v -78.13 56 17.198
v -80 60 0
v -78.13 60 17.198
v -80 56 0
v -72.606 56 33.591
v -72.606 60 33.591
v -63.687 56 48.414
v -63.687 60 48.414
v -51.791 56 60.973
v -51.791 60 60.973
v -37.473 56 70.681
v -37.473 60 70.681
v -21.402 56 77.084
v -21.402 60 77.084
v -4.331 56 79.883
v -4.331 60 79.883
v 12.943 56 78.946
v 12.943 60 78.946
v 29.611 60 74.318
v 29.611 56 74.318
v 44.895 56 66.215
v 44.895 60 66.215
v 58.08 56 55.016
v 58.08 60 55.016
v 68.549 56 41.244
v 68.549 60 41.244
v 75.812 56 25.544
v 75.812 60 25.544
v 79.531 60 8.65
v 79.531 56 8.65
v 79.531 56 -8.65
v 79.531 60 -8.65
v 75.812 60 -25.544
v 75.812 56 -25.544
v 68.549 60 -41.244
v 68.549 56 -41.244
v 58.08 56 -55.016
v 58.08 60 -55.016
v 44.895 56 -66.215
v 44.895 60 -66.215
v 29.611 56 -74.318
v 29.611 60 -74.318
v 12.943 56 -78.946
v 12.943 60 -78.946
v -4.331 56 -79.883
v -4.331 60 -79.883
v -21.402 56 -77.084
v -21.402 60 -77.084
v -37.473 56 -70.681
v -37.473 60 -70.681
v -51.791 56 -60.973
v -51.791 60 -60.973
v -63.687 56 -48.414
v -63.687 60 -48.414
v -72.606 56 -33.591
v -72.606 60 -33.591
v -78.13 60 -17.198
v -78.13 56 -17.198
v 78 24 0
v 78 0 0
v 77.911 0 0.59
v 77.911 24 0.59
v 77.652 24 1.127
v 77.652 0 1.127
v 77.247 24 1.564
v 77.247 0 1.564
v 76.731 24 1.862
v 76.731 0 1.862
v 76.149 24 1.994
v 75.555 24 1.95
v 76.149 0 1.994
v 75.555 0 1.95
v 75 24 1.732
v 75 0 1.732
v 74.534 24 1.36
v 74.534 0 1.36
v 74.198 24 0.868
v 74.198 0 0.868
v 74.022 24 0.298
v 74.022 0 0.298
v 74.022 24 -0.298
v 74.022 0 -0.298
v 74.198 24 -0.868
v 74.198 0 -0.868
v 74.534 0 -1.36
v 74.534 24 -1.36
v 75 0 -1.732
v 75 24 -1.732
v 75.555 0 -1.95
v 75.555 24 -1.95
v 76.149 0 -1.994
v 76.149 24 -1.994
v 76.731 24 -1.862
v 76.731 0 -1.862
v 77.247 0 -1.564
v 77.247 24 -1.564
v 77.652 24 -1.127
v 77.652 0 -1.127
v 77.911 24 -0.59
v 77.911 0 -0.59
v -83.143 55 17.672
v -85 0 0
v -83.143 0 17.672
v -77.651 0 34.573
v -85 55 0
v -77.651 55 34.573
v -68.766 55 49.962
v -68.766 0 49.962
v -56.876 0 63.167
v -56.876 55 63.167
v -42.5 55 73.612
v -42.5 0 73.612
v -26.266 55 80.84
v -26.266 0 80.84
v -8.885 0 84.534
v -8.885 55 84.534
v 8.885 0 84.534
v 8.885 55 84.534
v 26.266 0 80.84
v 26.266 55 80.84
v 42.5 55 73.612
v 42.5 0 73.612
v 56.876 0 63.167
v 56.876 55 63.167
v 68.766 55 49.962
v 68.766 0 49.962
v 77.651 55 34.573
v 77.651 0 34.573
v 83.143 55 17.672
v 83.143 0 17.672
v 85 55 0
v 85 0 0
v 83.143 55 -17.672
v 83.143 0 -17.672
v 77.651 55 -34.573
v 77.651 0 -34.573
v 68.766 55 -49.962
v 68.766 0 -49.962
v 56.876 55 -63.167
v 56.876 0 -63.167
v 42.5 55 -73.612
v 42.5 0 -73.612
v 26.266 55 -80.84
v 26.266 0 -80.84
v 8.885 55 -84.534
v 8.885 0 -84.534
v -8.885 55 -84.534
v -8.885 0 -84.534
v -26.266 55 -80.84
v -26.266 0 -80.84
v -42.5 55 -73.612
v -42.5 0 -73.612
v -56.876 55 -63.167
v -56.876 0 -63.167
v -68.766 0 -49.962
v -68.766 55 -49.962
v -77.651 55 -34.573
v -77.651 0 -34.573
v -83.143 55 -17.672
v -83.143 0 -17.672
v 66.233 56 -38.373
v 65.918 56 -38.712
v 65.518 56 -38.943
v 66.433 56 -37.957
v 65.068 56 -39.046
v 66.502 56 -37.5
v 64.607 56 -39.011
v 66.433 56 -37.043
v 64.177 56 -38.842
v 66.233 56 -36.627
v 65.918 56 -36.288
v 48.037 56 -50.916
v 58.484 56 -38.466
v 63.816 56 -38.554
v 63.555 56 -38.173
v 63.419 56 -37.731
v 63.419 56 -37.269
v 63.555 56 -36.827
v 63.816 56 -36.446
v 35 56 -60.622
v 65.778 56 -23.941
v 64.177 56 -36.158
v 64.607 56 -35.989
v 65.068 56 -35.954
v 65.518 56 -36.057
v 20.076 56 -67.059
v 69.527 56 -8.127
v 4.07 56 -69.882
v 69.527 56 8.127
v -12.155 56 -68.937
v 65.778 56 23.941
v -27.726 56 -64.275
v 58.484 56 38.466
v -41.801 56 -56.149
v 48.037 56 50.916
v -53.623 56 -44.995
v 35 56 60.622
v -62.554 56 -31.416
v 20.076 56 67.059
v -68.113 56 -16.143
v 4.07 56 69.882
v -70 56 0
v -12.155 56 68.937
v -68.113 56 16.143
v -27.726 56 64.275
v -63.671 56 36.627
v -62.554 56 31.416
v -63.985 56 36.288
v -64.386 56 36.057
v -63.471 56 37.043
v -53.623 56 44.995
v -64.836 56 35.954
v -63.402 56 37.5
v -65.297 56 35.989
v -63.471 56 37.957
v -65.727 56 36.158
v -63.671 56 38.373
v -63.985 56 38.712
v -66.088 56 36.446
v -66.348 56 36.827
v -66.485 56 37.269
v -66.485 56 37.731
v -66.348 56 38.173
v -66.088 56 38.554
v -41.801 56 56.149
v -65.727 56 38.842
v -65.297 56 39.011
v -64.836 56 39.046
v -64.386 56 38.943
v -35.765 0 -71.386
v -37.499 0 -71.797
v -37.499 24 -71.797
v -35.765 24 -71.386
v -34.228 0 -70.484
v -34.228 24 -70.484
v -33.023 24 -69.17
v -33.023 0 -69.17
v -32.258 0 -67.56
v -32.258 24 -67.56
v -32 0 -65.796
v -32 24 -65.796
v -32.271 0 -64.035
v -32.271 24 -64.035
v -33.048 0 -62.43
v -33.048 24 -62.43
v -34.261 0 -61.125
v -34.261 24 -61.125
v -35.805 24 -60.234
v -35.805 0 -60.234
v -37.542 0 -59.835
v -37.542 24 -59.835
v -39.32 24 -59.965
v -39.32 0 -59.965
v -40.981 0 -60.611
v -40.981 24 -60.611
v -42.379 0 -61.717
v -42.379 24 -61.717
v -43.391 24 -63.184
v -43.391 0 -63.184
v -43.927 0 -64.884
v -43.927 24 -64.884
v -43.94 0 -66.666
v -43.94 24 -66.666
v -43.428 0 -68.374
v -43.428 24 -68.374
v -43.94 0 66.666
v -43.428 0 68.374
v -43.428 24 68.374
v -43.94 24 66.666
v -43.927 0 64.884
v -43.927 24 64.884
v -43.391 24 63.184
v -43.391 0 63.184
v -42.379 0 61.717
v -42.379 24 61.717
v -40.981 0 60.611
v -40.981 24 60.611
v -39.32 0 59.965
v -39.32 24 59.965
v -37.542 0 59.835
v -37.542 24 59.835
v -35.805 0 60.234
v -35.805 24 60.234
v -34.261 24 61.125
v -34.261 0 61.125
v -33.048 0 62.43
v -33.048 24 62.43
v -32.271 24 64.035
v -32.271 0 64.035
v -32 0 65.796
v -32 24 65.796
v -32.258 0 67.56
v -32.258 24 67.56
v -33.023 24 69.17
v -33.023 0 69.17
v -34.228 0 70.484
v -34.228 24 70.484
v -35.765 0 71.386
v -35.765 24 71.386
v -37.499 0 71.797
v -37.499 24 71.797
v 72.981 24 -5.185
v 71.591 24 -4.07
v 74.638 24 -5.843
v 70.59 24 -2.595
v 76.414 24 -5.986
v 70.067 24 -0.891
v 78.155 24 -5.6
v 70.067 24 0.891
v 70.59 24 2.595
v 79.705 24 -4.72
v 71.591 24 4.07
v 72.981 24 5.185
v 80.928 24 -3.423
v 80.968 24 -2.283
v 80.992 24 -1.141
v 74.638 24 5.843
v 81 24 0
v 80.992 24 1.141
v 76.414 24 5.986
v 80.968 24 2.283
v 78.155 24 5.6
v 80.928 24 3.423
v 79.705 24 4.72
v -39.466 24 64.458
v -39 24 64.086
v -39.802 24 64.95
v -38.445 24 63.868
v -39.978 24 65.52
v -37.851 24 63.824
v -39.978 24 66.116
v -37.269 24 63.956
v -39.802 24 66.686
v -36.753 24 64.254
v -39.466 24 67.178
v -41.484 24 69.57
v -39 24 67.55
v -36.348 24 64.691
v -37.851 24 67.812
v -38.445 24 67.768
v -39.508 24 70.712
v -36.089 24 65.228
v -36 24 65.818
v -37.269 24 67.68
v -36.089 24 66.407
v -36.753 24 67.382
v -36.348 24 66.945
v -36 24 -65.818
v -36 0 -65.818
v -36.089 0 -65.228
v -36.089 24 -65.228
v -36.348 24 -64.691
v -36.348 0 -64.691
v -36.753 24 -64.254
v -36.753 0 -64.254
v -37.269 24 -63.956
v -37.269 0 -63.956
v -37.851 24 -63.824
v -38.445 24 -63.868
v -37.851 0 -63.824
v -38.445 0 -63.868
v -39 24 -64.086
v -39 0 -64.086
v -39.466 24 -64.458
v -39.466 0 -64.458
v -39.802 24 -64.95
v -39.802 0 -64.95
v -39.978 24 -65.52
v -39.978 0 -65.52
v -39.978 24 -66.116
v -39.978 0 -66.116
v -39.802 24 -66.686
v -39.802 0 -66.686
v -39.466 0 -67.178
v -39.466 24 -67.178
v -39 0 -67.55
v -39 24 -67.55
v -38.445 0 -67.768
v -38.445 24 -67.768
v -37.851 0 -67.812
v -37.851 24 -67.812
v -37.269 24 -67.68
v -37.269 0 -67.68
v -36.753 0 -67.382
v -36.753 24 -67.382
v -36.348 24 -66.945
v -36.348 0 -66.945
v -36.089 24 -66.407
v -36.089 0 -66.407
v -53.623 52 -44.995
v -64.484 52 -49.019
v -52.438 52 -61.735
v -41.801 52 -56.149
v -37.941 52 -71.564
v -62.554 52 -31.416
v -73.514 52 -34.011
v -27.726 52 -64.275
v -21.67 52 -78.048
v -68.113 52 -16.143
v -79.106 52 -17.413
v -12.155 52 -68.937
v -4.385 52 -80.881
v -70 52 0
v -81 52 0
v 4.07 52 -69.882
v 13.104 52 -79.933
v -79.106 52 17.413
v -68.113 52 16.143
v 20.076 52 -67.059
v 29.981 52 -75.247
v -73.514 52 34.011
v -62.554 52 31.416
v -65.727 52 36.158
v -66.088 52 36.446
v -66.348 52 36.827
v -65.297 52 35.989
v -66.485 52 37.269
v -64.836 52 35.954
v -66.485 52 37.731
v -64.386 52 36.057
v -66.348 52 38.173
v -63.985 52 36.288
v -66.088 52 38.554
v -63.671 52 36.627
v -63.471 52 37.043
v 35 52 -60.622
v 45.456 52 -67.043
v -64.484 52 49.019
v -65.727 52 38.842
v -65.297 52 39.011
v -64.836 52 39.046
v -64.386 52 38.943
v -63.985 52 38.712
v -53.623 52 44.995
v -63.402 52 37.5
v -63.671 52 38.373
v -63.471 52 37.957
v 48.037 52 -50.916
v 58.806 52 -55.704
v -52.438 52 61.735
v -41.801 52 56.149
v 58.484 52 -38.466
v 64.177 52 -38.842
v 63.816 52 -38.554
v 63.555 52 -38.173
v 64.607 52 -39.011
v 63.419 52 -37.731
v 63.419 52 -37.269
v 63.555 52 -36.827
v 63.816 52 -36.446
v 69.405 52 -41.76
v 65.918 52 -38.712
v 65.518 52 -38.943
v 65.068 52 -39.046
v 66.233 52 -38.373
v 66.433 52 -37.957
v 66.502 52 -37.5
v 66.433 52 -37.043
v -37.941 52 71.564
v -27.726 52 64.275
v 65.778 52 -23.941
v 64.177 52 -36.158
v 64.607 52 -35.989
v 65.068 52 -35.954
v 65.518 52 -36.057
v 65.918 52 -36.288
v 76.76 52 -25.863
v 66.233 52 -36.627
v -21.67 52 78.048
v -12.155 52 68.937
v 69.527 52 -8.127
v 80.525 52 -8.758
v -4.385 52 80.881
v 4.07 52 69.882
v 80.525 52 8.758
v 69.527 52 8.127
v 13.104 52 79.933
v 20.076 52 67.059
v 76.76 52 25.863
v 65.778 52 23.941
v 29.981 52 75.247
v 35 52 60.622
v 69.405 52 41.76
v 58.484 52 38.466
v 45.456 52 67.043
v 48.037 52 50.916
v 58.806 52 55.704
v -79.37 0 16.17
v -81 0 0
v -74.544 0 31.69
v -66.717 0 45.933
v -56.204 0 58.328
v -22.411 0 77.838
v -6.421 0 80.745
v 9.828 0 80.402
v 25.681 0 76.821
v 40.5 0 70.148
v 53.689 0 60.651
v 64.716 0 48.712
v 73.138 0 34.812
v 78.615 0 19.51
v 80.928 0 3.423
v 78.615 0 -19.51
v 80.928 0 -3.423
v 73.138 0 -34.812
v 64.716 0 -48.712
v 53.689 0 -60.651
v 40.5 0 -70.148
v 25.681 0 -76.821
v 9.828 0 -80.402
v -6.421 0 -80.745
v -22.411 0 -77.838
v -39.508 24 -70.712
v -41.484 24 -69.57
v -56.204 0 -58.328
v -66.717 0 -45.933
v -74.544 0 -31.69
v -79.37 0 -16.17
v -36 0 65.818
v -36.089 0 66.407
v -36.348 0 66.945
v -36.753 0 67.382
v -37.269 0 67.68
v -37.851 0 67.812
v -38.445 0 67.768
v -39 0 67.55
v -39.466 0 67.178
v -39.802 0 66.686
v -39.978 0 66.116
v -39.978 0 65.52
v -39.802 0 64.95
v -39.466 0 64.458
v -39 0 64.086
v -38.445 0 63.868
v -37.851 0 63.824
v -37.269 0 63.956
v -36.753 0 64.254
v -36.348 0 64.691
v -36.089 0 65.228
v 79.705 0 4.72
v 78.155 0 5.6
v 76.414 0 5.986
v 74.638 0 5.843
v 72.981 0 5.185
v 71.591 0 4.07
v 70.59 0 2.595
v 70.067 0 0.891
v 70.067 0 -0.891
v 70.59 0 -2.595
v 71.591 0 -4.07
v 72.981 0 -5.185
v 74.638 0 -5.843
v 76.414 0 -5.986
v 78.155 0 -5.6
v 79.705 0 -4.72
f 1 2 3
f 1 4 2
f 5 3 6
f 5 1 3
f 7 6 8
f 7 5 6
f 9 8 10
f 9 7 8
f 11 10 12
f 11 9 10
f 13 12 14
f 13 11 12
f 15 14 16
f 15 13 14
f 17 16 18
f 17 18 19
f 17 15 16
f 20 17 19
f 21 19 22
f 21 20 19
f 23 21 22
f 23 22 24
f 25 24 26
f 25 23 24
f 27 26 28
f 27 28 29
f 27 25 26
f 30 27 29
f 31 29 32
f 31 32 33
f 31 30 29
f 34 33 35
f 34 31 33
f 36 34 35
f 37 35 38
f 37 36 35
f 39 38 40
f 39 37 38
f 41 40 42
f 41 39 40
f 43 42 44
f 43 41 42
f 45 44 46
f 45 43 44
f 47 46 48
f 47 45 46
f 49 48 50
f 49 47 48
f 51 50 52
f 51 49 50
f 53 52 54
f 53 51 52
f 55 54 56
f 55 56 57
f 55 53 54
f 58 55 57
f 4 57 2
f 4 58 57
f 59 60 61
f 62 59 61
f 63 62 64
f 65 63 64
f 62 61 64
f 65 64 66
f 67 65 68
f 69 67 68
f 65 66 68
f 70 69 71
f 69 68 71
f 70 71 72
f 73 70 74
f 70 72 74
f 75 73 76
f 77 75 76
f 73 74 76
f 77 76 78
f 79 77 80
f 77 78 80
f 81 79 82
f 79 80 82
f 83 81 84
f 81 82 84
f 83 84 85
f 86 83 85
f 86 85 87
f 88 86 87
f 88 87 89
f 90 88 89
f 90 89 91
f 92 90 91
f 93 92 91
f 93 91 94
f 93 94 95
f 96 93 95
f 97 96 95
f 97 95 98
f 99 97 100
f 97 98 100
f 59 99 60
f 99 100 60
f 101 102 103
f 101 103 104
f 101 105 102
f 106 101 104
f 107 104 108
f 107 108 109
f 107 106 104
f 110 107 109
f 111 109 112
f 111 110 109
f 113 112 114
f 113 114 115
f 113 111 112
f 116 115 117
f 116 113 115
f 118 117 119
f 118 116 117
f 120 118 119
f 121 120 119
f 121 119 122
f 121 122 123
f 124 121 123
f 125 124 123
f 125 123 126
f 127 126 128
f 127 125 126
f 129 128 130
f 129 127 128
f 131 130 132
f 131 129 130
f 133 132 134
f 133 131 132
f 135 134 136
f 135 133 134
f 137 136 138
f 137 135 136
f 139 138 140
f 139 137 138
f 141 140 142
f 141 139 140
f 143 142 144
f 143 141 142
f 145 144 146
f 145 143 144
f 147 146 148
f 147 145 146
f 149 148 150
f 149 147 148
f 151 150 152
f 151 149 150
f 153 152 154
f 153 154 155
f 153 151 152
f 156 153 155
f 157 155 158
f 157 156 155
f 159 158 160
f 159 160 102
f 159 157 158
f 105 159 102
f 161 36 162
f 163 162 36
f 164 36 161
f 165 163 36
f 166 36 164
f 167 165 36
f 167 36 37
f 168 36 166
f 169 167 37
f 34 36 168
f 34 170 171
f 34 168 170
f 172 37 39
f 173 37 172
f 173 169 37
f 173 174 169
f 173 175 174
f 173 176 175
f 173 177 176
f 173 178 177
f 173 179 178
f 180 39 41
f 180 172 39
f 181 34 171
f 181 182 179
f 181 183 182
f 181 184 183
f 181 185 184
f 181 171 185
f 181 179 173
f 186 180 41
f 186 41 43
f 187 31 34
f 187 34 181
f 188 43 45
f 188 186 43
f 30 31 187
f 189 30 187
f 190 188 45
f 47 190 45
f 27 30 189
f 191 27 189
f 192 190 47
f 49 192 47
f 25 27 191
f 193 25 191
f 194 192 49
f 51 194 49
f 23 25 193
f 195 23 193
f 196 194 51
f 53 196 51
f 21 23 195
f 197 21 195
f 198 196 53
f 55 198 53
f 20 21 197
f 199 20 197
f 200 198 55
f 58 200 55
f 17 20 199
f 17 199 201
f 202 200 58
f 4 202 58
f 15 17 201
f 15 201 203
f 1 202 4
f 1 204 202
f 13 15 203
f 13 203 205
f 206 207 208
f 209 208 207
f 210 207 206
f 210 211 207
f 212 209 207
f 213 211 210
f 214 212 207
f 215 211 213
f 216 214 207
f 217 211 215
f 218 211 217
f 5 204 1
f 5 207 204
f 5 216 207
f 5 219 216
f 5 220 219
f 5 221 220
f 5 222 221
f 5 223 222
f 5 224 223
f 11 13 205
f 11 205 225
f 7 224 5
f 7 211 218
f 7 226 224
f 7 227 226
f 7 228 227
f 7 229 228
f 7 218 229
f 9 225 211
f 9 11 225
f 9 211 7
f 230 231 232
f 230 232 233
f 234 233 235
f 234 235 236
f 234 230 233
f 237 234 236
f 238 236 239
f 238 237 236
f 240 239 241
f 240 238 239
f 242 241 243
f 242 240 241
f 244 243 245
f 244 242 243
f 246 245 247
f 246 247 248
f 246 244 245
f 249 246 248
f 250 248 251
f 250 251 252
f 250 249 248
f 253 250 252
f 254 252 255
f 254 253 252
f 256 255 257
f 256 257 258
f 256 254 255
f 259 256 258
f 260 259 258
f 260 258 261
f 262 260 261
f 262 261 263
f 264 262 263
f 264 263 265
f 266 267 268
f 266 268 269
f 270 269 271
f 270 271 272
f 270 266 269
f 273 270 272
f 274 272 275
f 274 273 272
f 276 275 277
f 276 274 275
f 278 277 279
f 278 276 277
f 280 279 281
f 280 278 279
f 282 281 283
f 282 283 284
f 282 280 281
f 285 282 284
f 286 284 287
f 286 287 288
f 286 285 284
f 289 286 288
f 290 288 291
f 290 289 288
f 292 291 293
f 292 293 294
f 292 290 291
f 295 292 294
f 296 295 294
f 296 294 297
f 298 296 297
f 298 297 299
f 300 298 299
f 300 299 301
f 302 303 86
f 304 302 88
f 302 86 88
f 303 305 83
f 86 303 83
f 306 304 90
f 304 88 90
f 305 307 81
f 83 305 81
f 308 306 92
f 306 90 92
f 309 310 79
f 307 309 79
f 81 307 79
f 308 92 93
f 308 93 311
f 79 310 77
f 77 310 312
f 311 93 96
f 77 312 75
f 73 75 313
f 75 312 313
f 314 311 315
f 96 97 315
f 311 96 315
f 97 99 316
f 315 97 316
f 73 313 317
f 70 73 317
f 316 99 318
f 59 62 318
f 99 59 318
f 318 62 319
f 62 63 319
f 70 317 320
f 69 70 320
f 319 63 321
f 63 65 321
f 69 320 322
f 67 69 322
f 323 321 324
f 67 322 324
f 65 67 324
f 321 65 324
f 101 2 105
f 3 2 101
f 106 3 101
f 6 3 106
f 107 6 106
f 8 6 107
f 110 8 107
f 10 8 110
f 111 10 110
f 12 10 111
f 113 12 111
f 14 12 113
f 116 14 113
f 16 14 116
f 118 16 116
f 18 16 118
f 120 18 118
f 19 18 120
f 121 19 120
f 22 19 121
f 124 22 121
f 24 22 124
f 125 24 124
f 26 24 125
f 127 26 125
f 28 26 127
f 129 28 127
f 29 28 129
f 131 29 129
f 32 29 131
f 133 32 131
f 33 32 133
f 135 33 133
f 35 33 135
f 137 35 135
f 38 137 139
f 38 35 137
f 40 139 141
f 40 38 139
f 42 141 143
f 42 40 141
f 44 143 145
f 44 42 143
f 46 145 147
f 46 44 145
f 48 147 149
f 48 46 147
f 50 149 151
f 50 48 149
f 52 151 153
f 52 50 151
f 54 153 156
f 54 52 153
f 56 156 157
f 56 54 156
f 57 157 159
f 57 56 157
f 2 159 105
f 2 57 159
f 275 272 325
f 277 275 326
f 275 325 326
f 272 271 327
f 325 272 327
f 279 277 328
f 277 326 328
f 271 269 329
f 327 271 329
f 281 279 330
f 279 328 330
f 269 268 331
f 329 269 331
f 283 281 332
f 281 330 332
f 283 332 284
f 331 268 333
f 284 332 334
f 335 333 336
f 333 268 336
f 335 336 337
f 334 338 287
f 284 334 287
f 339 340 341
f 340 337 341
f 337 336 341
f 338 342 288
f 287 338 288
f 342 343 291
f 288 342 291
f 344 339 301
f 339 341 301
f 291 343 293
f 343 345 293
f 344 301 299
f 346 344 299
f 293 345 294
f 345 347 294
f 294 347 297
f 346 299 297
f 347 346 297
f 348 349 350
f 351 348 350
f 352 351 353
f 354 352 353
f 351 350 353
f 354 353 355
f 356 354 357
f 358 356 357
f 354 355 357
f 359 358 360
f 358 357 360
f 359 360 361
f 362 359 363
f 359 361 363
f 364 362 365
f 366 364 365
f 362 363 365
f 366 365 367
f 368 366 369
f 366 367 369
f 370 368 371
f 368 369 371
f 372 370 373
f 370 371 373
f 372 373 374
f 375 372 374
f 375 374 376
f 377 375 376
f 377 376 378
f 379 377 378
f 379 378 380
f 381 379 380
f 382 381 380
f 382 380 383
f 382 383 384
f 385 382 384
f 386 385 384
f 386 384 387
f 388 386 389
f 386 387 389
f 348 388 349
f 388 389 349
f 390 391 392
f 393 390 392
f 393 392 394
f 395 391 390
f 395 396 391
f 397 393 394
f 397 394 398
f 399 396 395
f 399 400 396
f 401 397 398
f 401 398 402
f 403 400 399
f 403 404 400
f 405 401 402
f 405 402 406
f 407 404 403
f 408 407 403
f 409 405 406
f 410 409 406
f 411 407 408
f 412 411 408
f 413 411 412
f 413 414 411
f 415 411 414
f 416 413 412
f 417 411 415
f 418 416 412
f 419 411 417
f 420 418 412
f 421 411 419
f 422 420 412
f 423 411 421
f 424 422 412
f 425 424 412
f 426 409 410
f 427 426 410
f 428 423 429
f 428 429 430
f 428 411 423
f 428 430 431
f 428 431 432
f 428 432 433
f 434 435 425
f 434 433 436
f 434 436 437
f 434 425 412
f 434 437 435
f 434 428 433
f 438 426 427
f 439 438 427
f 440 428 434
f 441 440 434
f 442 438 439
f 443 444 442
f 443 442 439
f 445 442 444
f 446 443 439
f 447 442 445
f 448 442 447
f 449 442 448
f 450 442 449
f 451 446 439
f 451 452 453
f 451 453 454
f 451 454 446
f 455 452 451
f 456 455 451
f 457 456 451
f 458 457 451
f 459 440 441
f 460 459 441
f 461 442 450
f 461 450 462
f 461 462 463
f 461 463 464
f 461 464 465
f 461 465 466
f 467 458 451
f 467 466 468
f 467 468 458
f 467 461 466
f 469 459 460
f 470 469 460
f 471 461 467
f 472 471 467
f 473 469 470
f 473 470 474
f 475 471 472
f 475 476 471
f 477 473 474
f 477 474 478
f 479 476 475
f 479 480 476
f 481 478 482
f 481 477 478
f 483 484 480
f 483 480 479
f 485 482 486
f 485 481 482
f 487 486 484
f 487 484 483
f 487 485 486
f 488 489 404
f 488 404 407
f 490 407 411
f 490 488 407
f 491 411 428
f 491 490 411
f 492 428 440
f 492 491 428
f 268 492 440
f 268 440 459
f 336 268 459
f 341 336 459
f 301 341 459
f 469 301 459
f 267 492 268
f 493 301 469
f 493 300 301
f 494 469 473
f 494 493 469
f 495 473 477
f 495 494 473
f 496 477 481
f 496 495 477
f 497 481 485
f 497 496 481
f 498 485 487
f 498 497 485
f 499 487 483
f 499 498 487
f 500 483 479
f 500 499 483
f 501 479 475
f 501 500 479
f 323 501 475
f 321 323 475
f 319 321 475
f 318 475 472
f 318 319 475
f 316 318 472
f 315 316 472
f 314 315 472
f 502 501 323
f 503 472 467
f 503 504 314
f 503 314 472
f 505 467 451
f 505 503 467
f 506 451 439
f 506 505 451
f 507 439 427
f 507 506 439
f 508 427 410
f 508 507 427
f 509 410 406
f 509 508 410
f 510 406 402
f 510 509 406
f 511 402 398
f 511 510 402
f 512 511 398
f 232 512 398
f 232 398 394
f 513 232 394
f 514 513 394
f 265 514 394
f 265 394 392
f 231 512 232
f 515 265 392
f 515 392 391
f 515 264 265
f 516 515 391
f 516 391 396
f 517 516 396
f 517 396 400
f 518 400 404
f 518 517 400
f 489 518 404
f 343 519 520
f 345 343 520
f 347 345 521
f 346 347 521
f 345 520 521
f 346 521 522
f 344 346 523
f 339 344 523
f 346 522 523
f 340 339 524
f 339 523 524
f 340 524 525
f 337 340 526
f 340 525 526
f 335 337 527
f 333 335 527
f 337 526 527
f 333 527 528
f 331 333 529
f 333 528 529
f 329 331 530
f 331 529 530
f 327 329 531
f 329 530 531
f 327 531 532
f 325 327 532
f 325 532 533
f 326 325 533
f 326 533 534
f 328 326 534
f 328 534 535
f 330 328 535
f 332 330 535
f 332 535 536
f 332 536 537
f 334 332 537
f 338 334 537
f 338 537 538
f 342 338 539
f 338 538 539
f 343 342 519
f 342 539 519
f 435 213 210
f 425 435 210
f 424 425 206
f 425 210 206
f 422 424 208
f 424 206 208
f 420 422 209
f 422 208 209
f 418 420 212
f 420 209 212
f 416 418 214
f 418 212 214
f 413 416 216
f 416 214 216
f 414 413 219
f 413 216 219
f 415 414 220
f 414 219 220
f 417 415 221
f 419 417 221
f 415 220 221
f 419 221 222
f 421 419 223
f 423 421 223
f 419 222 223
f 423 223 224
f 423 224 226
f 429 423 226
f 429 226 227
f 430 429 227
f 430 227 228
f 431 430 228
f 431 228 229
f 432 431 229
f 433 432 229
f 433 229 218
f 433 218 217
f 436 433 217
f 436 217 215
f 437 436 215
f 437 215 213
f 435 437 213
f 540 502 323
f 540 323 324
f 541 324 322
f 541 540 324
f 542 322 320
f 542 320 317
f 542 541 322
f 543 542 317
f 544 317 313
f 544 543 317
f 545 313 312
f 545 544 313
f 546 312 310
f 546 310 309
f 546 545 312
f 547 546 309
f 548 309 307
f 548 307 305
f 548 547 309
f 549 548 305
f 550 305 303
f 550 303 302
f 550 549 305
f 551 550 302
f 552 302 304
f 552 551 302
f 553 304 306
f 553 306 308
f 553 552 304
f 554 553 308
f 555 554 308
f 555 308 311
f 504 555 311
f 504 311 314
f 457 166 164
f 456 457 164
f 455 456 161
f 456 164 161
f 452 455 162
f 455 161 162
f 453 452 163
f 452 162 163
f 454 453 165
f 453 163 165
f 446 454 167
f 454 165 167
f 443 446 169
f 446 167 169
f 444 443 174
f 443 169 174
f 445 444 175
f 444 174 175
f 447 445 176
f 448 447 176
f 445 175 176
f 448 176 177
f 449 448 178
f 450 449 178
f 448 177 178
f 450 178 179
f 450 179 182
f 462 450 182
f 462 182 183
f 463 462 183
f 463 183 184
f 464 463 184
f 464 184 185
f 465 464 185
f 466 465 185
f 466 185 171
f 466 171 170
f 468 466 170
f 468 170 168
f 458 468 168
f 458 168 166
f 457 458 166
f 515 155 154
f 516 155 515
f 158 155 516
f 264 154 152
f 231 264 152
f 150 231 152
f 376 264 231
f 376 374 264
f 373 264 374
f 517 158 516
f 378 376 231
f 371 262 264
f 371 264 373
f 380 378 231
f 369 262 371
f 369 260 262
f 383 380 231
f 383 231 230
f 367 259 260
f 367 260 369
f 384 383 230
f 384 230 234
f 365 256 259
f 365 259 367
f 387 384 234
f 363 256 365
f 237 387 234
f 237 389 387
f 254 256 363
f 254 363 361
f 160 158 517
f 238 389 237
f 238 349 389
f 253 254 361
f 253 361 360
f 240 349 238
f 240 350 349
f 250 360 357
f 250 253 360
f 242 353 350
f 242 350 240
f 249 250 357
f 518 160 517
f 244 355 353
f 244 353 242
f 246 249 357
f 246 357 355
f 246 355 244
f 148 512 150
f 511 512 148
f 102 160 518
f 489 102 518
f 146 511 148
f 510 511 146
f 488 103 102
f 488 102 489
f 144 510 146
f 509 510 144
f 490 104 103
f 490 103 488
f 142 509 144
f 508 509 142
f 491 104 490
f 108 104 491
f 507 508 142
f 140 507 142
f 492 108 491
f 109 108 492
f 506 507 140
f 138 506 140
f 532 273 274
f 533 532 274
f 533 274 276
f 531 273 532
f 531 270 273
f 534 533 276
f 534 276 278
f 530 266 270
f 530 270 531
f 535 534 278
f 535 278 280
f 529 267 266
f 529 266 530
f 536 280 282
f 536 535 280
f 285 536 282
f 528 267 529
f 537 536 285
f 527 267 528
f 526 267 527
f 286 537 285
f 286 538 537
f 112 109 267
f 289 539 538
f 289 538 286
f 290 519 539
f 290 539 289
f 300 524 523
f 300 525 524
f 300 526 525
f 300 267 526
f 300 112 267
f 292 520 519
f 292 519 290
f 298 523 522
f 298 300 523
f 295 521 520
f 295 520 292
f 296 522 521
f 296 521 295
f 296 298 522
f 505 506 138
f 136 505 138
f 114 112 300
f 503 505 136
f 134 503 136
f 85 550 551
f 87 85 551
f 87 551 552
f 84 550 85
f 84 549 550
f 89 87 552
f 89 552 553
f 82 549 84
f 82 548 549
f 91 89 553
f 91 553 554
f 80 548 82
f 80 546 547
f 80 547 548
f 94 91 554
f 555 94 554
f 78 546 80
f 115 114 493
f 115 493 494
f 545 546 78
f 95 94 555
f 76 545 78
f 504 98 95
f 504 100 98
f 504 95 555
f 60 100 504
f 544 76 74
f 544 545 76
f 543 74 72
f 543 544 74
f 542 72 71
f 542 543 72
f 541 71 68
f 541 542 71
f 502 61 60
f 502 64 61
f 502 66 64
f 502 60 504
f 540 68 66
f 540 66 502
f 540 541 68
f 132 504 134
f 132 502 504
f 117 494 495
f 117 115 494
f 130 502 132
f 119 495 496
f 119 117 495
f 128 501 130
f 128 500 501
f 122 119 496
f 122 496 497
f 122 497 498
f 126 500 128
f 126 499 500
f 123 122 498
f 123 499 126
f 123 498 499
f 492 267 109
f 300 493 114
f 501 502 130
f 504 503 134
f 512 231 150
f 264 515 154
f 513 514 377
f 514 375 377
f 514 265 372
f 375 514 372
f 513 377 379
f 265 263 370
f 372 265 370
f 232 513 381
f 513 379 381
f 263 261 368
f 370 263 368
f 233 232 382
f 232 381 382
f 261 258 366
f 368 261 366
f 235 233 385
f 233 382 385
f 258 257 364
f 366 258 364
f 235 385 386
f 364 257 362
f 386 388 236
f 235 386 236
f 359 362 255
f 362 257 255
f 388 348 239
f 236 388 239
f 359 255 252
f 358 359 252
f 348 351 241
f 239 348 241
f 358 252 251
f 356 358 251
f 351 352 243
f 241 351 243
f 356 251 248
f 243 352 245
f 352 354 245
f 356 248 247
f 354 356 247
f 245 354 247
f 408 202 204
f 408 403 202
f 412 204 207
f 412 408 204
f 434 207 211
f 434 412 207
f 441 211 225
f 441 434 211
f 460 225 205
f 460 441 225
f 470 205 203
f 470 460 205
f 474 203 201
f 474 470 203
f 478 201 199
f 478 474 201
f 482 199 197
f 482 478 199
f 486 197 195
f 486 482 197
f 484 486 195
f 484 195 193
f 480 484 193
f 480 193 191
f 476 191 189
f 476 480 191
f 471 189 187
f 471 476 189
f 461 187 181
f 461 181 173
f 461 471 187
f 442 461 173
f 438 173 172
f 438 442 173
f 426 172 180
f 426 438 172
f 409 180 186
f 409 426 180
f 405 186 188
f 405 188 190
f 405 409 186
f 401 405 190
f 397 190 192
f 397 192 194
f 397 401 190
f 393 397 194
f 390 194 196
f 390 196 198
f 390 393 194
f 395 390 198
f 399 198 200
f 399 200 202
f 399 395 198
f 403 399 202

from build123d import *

# Parameters (mm, degrees)
SKETCH2_R           = 2
BOSS_EXTRUDE1_DEPTH = 24
SKETCH3_R           = 1.55
CUT_EXTRUDE1_DEPTH  = 10


with BuildPart() as part:
    # Sketch1 → Revolve1 (revolve)
    with BuildSketch(Plane.XY):
        Polygon((-85, 0), (-85, 55), (-80, 60), (-80, 56), (-70, 56), (-70, 52), (-81, 52), (-81, 0), align=None)
    revolve(axis=Axis((0, -62.463486945, 0), (0, 1, 0)))

    # Sketch2 → Boss-Extrude1 (add)
    with BuildSketch(Plane.XZ):
        with BuildLine():
            ThreePointArc((-43.428412772, 68.37377395), (-35, 60.621778265), (-37.499218807, 71.796995681))
            ThreePointArc((-37.499218807, 71.796995681), (-40.5, 70.148057707), (-43.428412772, 68.37377395))
        make_face()
        with Locations((-38, 65.817930688)):
            Circle(SKETCH2_R, mode=Mode.SUBTRACT)
        with BuildLine():
            ThreePointArc((-43.428412772, -68.37377395), (-40.5, -70.148057707), (-37.499218807, -71.796995681))
            ThreePointArc((-37.499218807, -71.796995681), (-35, -60.621778265), (-43.428412772, -68.37377395))
        make_face()
        with Locations((-38, -65.817930688)):
            Circle(SKETCH2_R, mode=Mode.SUBTRACT)
        with BuildLine():
            ThreePointArc((81, 0), (80.981905874, 1.711993298), (80.927631579, 3.423221731))
            ThreePointArc((80.927631579, 3.423221731), (70, 0), (80.927631579, -3.423221731))
            ThreePointArc((80.927631579, -3.423221731), (80.981905874, -1.711993298), (81, 0))
        make_face()
        with Locations((76, 0)):
            Circle(SKETCH2_R, mode=Mode.SUBTRACT)
    extrude(amount=-BOSS_EXTRUDE1_DEPTH)

    # Sketch3 → Cut-Extrude1 (cut)
    with BuildSketch(Plane(origin=(0, 56, 0), x_dir=(1, 0, 0), z_dir=(0, 1, 0))):
        with Locations((-64.951905284, -37.5)):
            Circle(SKETCH3_R)
        with Locations((64.951905284, 37.5)):
            Circle(SKETCH3_R)
    extrude(amount=-CUT_EXTRUDE1_DEPTH, mode=Mode.SUBTRACT)


solid = part.part
